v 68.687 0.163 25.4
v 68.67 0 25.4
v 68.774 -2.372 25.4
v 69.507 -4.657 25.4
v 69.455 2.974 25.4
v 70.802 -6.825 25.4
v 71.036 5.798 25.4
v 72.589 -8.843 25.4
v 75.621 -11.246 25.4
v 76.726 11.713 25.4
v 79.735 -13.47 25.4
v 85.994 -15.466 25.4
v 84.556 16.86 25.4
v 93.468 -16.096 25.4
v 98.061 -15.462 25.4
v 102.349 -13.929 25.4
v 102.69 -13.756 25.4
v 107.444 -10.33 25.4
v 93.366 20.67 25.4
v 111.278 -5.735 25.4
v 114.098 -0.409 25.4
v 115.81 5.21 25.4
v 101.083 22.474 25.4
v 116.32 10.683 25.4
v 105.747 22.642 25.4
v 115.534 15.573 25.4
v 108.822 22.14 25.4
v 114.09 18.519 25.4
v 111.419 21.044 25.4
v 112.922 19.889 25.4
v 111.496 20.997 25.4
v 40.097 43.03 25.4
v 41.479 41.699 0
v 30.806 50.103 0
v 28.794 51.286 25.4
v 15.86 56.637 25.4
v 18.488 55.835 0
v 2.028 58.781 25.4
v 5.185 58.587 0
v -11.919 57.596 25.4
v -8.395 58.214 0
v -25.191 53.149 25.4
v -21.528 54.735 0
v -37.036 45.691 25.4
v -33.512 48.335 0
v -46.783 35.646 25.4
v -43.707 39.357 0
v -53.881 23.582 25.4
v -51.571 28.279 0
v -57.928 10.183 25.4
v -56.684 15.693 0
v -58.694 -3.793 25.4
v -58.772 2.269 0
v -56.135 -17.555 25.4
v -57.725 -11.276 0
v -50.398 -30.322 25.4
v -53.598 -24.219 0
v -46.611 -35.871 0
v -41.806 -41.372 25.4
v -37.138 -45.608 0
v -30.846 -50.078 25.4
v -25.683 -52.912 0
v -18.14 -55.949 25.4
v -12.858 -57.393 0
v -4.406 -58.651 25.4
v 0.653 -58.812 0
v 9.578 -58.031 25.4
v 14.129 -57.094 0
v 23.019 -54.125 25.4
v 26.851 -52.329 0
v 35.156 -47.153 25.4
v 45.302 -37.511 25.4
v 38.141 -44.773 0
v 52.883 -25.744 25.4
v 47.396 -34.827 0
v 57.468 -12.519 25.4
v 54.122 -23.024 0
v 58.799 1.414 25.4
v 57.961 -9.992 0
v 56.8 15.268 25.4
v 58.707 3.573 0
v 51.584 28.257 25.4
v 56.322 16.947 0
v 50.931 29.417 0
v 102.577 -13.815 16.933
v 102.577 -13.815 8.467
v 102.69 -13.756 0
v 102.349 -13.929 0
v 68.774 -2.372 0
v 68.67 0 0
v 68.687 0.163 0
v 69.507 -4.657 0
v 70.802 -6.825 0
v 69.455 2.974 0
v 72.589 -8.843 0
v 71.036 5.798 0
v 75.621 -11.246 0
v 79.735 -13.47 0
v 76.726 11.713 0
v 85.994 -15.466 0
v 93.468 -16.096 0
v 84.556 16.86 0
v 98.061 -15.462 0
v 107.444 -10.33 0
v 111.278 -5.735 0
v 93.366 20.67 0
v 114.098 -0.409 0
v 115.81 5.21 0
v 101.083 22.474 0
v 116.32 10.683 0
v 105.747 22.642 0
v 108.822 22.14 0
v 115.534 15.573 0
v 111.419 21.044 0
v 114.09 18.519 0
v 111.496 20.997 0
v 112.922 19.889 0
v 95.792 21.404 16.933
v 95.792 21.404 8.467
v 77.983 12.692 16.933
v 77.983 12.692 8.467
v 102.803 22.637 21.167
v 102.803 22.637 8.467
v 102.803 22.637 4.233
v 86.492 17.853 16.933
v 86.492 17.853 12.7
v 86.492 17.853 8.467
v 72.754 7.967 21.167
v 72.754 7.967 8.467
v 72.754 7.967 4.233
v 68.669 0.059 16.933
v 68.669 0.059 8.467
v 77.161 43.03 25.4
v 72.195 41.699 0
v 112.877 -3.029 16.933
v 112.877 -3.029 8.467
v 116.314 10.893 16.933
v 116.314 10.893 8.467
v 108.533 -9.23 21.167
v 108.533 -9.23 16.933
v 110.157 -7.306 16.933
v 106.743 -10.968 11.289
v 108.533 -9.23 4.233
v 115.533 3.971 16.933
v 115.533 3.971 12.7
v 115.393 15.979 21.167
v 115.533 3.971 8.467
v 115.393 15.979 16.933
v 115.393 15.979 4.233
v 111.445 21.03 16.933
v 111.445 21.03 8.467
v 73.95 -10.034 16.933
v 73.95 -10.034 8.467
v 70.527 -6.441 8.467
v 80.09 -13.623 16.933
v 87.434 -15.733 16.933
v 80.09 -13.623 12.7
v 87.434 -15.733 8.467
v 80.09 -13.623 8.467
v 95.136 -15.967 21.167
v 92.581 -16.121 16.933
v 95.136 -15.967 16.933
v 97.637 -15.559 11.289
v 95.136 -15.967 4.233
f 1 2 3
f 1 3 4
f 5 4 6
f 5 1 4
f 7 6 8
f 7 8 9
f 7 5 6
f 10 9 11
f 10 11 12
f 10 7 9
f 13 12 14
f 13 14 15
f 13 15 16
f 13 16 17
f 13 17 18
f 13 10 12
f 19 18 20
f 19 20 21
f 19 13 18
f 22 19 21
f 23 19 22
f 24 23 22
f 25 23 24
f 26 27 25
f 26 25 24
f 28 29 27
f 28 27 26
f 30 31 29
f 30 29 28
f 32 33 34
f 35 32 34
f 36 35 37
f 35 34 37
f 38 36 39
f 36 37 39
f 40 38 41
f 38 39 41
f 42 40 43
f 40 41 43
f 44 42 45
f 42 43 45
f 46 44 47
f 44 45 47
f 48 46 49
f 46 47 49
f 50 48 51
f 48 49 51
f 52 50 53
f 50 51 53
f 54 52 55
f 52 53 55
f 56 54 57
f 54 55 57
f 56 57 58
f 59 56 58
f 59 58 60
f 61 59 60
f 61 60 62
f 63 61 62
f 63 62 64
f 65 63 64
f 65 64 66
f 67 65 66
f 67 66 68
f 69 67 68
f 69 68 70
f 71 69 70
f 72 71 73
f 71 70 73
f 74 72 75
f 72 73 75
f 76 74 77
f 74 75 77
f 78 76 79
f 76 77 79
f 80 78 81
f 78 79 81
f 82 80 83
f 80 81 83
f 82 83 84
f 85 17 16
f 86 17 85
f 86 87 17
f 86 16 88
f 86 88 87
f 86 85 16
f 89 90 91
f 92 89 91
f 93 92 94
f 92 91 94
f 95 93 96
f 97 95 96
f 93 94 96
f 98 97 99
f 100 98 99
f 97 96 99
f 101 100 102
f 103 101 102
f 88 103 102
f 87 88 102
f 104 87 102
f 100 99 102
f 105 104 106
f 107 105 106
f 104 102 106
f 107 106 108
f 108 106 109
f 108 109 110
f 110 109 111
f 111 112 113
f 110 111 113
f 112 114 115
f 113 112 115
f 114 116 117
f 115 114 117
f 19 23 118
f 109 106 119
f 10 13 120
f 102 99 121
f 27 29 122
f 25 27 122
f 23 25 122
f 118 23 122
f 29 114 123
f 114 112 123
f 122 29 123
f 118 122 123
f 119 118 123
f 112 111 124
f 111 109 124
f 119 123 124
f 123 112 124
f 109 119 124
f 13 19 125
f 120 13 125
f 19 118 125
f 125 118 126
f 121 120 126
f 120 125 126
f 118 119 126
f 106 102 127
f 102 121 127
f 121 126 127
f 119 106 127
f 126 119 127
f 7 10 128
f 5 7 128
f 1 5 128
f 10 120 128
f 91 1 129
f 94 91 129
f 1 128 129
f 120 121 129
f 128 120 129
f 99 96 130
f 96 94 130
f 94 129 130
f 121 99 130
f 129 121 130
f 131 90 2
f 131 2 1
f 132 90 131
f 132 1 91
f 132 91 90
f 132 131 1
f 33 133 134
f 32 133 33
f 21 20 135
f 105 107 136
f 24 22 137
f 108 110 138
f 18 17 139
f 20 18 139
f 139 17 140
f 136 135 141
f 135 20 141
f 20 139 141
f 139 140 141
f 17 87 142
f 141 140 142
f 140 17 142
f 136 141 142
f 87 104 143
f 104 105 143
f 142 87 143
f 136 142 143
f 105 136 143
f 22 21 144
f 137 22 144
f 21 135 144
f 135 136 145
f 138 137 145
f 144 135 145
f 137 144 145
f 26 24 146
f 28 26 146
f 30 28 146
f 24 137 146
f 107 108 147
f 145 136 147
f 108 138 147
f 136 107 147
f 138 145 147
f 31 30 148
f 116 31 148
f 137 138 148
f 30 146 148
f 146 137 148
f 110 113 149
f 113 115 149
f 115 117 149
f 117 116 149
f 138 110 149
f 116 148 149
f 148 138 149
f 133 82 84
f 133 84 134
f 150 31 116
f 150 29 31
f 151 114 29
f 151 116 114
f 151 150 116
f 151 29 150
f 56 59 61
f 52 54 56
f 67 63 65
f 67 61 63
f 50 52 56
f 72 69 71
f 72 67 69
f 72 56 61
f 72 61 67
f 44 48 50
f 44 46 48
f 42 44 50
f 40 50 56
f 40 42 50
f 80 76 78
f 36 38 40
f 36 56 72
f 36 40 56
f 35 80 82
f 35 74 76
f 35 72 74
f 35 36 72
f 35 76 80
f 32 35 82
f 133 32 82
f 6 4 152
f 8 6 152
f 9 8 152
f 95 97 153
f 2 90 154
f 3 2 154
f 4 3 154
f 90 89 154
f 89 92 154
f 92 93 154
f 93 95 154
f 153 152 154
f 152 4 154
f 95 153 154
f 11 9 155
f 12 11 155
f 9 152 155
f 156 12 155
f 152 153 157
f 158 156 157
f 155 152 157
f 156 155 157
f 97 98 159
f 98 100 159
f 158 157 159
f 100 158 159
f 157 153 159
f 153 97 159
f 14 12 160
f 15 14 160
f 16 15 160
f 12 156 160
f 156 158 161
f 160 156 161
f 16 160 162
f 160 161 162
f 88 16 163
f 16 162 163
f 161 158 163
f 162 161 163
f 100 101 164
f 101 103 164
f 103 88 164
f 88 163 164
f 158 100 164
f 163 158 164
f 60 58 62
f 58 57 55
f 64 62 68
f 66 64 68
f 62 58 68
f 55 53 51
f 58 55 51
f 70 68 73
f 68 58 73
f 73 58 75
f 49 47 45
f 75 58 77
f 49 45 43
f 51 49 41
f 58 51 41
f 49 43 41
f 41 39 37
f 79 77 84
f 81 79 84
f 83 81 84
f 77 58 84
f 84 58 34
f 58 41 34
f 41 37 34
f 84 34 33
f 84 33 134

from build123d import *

# Parameters (mm, degrees)
F1_DEPTH = 25.4
F1_TAPER = -3
F2_R     = 58.8161051618
F3_DEPTH = 25.4
F5_DEPTH = 25.4


with BuildPart() as f1:
    # F0 (on Top) → F1 (new body)
    with BuildSketch(Plane.XY):
        Polygon((72.1950531006, 41.6988953948), (21.782964468, 41.6988953948), (0, 0), align=None)
    extrude(amount=F1_DEPTH, taper=F1_TAPER)

    # F2 (on Top) → F3 (join)
    with BuildSketch(Plane.XY):
        Circle(F2_R)
    extrude(amount=F3_DEPTH)


with BuildPart() as f5:
    # F4 (on Top) → F5 (new body)
    with BuildSketch(Plane.XY):
        with BuildLine():
            add(Edge.make_bspline(
                [(102.3487746519, -13.9289051389), (90.9438132493, -19.4379005678), (68.8603634249, -2.8386279957), (68.6699151955, 2.9e-09)],
                knots=[0.5089518547, 0.5089518547, 0.5089518547, 0.5089518547, 0.7802595866, 0.7802595866, 0.7802595866, 0.7802595866], degree=3))
            add(Edge.make_bspline(
                [(68.6699151993, 0), (67.5902988731, -11.1450596771), (88.9771118669, -20.5400376345), (102.3487746716, -13.9289051294)],
                knots=[0, 0, 0, 0, 0.3185429266, 0.3185429266, 0.3185429266, 0.3185429266], degree=3))
        make_face()
        with BuildLine():
            add(Edge.make_bspline(
                [(68.6699151993, 0), (68.6658465147, 0.0606436807), (68.6717699918, 0.1150068803), (68.6873421872, 0.1634600038)],
                knots=[0.7802595866, 0.7802595866, 0.7802595866, 0.7802595866, 0.7860557316, 0.7860557316, 0.7860557316, 0.7860557316], degree=3))
            add(Edge.make_bspline(
                [(68.6873421872, 0.1634600038), (68.6809995803, 0.1089328226), (68.6751893103, 0.0544455286), (68.6699151993, 0)],
                knots=[0.9984438632, 0.9984438632, 0.9984438632, 0.9984438632, 1, 1, 1, 1], degree=3))
        make_face()
        with BuildLine():
            add(Edge.make_bspline(
                [(68.6873421872, 0.1634600038), (68.6809995803, 0.1089328226), (68.6751893103, 0.0544455286), (68.6699151993, 0)],
                knots=[0.9984438632, 0.9984438632, 0.9984438632, 0.9984438632, 1, 1, 1, 1], degree=3))
            add(Edge.make_bspline(
                [(102.3487746519, -13.9289051389), (90.9438132493, -19.4379005678), (68.8603634249, -2.8386279957), (68.6699151955, 2.9e-09)],
                knots=[0.5089518547, 0.5089518547, 0.5089518547, 0.5089518547, 0.7802595866, 0.7802595866, 0.7802595866, 0.7802595866], degree=3))
            add(Edge.make_bspline(
                [(102.3487746716, -13.9289051294), (102.463249954, -13.8723069881), (102.5771377954, -13.8145357377), (102.6904337673, -13.7556119854)],
                knots=[0.3185429266, 0.3185429266, 0.3185429266, 0.3185429266, 0.321269984, 0.321269984, 0.321269984, 0.321269984], degree=3))
            add(Edge.make_bspline(
                [(111.4961206965, 20.9973230922), (114.443001781, 18.9594226446), (113.7154739438, -7.8936603848), (102.6904337671, -13.7556119915)],
                knots=[0.2389176353, 0.2389176353, 0.2389176353, 0.2389176353, 0.5062169032, 0.5062169032, 0.5062169032, 0.5062169032], degree=3))
            add(Edge.make_bspline(
                [(111.4961206913, 20.9973230958), (111.4706057422, 21.0131450489), (111.4449840026, 21.0288485478), (111.4192560928, 21.0444338975)],
                knots=[0.6355906198, 0.6355906198, 0.6355906198, 0.6355906198, 0.6364394283, 0.6364394283, 0.6364394283, 0.6364394283], degree=3))
            add(Edge.make_bspline(
                [(92.5777554512, 0), (103.1894933654, 4.768783262), (108.7544603715, 22.4735331076), (111.4192560928, 21.0444338975)],
                knots=[0, 0, 0, 0, 0.2366183341, 0.2366183341, 0.2366183341, 0.2366183341], degree=3))
            add(Edge.make_bspline(
                [(68.6873421872, 0.1634600038), (69.2621349119, 1.9519363241), (82.9828924293, -4.3118123111), (92.5777554512, 0)],
                knots=[0.7860557316, 0.7860557316, 0.7860557316, 0.7860557316, 1, 1, 1, 1], degree=3))
        make_face()
        with BuildLine():
            add(Edge.make_bspline(
                [(102.3487746716, -13.9289051294), (102.463249954, -13.8723069881), (102.5771377954, -13.8145357377), (102.6904337673, -13.7556119854)],
                knots=[0.3185429266, 0.3185429266, 0.3185429266, 0.3185429266, 0.321269984, 0.321269984, 0.321269984, 0.321269984], degree=3))
            add(Edge.make_bspline(
                [(102.6904337673, -13.7556119854), (102.5776278097, -13.8155902761), (102.4637437995, -13.8733710177), (102.3487746519, -13.9289051389)],
                knots=[0.5062169032, 0.5062169032, 0.5062169032, 0.5062169032, 0.5089518547, 0.5089518547, 0.5089518547, 0.5089518547], degree=3))
        make_face()
        with BuildLine():
            add(Edge.make_bspline(
                [(111.4192560928, 21.0444338975), (100.4466781249, 27.6913580091), (70.1628241383, 12.8481293776), (68.6873421872, 0.1634600038)],
                knots=[0.6364394283, 0.6364394283, 0.6364394283, 0.6364394283, 0.9984438632, 0.9984438632, 0.9984438632, 0.9984438632], degree=3))
            add(Edge.make_bspline(
                [(68.6873421872, 0.1634600038), (69.2621349119, 1.9519363241), (82.9828924293, -4.3118123111), (92.5777554512, 0)],
                knots=[0.7860557316, 0.7860557316, 0.7860557316, 0.7860557316, 1, 1, 1, 1], degree=3))
            add(Edge.make_bspline(
                [(92.5777554512, 0), (103.1894933654, 4.768783262), (108.7544603715, 22.4735331076), (111.4192560928, 21.0444338975)],
                knots=[0, 0, 0, 0, 0.2366183341, 0.2366183341, 0.2366183341, 0.2366183341], degree=3))
        make_face()
        with BuildLine():
            add(Edge.make_bspline(
                [(111.4961206965, 20.9973230922), (114.443001781, 18.9594226446), (113.7154739438, -7.8936603848), (102.6904337671, -13.7556119915)],
                knots=[0.2389176353, 0.2389176353, 0.2389176353, 0.2389176353, 0.5062169032, 0.5062169032, 0.5062169032, 0.5062169032], degree=3))
            add(Edge.make_bspline(
                [(102.6904337673, -13.7556119854), (115.7489276571, -6.9640602047), (120.9445121969, 15.1383262128), (111.4961206913, 20.9973230958)],
                knots=[0.321269984, 0.321269984, 0.321269984, 0.321269984, 0.6355906198, 0.6355906198, 0.6355906198, 0.6355906198], degree=3))
        make_face()
        with BuildLine():
            add(Edge.make_bspline(
                [(111.4192560928, 21.0444338975), (111.4451508227, 21.0305468525), (111.4707717016, 21.0148530591), (111.4961206965, 20.9973230922)],
                knots=[0.2366183341, 0.2366183341, 0.2366183341, 0.2366183341, 0.2389176353, 0.2389176353, 0.2389176353, 0.2389176353], degree=3))
            add(Edge.make_bspline(
                [(111.4961206913, 20.9973230958), (111.4706057422, 21.0131450489), (111.4449840026, 21.0288485478), (111.4192560928, 21.0444338975)],
                knots=[0.6355906198, 0.6355906198, 0.6355906198, 0.6355906198, 0.6364394283, 0.6364394283, 0.6364394283, 0.6364394283], degree=3))
        make_face()
    extrude(amount=F5_DEPTH)


solid = Compound([f1.part, f5.part])
